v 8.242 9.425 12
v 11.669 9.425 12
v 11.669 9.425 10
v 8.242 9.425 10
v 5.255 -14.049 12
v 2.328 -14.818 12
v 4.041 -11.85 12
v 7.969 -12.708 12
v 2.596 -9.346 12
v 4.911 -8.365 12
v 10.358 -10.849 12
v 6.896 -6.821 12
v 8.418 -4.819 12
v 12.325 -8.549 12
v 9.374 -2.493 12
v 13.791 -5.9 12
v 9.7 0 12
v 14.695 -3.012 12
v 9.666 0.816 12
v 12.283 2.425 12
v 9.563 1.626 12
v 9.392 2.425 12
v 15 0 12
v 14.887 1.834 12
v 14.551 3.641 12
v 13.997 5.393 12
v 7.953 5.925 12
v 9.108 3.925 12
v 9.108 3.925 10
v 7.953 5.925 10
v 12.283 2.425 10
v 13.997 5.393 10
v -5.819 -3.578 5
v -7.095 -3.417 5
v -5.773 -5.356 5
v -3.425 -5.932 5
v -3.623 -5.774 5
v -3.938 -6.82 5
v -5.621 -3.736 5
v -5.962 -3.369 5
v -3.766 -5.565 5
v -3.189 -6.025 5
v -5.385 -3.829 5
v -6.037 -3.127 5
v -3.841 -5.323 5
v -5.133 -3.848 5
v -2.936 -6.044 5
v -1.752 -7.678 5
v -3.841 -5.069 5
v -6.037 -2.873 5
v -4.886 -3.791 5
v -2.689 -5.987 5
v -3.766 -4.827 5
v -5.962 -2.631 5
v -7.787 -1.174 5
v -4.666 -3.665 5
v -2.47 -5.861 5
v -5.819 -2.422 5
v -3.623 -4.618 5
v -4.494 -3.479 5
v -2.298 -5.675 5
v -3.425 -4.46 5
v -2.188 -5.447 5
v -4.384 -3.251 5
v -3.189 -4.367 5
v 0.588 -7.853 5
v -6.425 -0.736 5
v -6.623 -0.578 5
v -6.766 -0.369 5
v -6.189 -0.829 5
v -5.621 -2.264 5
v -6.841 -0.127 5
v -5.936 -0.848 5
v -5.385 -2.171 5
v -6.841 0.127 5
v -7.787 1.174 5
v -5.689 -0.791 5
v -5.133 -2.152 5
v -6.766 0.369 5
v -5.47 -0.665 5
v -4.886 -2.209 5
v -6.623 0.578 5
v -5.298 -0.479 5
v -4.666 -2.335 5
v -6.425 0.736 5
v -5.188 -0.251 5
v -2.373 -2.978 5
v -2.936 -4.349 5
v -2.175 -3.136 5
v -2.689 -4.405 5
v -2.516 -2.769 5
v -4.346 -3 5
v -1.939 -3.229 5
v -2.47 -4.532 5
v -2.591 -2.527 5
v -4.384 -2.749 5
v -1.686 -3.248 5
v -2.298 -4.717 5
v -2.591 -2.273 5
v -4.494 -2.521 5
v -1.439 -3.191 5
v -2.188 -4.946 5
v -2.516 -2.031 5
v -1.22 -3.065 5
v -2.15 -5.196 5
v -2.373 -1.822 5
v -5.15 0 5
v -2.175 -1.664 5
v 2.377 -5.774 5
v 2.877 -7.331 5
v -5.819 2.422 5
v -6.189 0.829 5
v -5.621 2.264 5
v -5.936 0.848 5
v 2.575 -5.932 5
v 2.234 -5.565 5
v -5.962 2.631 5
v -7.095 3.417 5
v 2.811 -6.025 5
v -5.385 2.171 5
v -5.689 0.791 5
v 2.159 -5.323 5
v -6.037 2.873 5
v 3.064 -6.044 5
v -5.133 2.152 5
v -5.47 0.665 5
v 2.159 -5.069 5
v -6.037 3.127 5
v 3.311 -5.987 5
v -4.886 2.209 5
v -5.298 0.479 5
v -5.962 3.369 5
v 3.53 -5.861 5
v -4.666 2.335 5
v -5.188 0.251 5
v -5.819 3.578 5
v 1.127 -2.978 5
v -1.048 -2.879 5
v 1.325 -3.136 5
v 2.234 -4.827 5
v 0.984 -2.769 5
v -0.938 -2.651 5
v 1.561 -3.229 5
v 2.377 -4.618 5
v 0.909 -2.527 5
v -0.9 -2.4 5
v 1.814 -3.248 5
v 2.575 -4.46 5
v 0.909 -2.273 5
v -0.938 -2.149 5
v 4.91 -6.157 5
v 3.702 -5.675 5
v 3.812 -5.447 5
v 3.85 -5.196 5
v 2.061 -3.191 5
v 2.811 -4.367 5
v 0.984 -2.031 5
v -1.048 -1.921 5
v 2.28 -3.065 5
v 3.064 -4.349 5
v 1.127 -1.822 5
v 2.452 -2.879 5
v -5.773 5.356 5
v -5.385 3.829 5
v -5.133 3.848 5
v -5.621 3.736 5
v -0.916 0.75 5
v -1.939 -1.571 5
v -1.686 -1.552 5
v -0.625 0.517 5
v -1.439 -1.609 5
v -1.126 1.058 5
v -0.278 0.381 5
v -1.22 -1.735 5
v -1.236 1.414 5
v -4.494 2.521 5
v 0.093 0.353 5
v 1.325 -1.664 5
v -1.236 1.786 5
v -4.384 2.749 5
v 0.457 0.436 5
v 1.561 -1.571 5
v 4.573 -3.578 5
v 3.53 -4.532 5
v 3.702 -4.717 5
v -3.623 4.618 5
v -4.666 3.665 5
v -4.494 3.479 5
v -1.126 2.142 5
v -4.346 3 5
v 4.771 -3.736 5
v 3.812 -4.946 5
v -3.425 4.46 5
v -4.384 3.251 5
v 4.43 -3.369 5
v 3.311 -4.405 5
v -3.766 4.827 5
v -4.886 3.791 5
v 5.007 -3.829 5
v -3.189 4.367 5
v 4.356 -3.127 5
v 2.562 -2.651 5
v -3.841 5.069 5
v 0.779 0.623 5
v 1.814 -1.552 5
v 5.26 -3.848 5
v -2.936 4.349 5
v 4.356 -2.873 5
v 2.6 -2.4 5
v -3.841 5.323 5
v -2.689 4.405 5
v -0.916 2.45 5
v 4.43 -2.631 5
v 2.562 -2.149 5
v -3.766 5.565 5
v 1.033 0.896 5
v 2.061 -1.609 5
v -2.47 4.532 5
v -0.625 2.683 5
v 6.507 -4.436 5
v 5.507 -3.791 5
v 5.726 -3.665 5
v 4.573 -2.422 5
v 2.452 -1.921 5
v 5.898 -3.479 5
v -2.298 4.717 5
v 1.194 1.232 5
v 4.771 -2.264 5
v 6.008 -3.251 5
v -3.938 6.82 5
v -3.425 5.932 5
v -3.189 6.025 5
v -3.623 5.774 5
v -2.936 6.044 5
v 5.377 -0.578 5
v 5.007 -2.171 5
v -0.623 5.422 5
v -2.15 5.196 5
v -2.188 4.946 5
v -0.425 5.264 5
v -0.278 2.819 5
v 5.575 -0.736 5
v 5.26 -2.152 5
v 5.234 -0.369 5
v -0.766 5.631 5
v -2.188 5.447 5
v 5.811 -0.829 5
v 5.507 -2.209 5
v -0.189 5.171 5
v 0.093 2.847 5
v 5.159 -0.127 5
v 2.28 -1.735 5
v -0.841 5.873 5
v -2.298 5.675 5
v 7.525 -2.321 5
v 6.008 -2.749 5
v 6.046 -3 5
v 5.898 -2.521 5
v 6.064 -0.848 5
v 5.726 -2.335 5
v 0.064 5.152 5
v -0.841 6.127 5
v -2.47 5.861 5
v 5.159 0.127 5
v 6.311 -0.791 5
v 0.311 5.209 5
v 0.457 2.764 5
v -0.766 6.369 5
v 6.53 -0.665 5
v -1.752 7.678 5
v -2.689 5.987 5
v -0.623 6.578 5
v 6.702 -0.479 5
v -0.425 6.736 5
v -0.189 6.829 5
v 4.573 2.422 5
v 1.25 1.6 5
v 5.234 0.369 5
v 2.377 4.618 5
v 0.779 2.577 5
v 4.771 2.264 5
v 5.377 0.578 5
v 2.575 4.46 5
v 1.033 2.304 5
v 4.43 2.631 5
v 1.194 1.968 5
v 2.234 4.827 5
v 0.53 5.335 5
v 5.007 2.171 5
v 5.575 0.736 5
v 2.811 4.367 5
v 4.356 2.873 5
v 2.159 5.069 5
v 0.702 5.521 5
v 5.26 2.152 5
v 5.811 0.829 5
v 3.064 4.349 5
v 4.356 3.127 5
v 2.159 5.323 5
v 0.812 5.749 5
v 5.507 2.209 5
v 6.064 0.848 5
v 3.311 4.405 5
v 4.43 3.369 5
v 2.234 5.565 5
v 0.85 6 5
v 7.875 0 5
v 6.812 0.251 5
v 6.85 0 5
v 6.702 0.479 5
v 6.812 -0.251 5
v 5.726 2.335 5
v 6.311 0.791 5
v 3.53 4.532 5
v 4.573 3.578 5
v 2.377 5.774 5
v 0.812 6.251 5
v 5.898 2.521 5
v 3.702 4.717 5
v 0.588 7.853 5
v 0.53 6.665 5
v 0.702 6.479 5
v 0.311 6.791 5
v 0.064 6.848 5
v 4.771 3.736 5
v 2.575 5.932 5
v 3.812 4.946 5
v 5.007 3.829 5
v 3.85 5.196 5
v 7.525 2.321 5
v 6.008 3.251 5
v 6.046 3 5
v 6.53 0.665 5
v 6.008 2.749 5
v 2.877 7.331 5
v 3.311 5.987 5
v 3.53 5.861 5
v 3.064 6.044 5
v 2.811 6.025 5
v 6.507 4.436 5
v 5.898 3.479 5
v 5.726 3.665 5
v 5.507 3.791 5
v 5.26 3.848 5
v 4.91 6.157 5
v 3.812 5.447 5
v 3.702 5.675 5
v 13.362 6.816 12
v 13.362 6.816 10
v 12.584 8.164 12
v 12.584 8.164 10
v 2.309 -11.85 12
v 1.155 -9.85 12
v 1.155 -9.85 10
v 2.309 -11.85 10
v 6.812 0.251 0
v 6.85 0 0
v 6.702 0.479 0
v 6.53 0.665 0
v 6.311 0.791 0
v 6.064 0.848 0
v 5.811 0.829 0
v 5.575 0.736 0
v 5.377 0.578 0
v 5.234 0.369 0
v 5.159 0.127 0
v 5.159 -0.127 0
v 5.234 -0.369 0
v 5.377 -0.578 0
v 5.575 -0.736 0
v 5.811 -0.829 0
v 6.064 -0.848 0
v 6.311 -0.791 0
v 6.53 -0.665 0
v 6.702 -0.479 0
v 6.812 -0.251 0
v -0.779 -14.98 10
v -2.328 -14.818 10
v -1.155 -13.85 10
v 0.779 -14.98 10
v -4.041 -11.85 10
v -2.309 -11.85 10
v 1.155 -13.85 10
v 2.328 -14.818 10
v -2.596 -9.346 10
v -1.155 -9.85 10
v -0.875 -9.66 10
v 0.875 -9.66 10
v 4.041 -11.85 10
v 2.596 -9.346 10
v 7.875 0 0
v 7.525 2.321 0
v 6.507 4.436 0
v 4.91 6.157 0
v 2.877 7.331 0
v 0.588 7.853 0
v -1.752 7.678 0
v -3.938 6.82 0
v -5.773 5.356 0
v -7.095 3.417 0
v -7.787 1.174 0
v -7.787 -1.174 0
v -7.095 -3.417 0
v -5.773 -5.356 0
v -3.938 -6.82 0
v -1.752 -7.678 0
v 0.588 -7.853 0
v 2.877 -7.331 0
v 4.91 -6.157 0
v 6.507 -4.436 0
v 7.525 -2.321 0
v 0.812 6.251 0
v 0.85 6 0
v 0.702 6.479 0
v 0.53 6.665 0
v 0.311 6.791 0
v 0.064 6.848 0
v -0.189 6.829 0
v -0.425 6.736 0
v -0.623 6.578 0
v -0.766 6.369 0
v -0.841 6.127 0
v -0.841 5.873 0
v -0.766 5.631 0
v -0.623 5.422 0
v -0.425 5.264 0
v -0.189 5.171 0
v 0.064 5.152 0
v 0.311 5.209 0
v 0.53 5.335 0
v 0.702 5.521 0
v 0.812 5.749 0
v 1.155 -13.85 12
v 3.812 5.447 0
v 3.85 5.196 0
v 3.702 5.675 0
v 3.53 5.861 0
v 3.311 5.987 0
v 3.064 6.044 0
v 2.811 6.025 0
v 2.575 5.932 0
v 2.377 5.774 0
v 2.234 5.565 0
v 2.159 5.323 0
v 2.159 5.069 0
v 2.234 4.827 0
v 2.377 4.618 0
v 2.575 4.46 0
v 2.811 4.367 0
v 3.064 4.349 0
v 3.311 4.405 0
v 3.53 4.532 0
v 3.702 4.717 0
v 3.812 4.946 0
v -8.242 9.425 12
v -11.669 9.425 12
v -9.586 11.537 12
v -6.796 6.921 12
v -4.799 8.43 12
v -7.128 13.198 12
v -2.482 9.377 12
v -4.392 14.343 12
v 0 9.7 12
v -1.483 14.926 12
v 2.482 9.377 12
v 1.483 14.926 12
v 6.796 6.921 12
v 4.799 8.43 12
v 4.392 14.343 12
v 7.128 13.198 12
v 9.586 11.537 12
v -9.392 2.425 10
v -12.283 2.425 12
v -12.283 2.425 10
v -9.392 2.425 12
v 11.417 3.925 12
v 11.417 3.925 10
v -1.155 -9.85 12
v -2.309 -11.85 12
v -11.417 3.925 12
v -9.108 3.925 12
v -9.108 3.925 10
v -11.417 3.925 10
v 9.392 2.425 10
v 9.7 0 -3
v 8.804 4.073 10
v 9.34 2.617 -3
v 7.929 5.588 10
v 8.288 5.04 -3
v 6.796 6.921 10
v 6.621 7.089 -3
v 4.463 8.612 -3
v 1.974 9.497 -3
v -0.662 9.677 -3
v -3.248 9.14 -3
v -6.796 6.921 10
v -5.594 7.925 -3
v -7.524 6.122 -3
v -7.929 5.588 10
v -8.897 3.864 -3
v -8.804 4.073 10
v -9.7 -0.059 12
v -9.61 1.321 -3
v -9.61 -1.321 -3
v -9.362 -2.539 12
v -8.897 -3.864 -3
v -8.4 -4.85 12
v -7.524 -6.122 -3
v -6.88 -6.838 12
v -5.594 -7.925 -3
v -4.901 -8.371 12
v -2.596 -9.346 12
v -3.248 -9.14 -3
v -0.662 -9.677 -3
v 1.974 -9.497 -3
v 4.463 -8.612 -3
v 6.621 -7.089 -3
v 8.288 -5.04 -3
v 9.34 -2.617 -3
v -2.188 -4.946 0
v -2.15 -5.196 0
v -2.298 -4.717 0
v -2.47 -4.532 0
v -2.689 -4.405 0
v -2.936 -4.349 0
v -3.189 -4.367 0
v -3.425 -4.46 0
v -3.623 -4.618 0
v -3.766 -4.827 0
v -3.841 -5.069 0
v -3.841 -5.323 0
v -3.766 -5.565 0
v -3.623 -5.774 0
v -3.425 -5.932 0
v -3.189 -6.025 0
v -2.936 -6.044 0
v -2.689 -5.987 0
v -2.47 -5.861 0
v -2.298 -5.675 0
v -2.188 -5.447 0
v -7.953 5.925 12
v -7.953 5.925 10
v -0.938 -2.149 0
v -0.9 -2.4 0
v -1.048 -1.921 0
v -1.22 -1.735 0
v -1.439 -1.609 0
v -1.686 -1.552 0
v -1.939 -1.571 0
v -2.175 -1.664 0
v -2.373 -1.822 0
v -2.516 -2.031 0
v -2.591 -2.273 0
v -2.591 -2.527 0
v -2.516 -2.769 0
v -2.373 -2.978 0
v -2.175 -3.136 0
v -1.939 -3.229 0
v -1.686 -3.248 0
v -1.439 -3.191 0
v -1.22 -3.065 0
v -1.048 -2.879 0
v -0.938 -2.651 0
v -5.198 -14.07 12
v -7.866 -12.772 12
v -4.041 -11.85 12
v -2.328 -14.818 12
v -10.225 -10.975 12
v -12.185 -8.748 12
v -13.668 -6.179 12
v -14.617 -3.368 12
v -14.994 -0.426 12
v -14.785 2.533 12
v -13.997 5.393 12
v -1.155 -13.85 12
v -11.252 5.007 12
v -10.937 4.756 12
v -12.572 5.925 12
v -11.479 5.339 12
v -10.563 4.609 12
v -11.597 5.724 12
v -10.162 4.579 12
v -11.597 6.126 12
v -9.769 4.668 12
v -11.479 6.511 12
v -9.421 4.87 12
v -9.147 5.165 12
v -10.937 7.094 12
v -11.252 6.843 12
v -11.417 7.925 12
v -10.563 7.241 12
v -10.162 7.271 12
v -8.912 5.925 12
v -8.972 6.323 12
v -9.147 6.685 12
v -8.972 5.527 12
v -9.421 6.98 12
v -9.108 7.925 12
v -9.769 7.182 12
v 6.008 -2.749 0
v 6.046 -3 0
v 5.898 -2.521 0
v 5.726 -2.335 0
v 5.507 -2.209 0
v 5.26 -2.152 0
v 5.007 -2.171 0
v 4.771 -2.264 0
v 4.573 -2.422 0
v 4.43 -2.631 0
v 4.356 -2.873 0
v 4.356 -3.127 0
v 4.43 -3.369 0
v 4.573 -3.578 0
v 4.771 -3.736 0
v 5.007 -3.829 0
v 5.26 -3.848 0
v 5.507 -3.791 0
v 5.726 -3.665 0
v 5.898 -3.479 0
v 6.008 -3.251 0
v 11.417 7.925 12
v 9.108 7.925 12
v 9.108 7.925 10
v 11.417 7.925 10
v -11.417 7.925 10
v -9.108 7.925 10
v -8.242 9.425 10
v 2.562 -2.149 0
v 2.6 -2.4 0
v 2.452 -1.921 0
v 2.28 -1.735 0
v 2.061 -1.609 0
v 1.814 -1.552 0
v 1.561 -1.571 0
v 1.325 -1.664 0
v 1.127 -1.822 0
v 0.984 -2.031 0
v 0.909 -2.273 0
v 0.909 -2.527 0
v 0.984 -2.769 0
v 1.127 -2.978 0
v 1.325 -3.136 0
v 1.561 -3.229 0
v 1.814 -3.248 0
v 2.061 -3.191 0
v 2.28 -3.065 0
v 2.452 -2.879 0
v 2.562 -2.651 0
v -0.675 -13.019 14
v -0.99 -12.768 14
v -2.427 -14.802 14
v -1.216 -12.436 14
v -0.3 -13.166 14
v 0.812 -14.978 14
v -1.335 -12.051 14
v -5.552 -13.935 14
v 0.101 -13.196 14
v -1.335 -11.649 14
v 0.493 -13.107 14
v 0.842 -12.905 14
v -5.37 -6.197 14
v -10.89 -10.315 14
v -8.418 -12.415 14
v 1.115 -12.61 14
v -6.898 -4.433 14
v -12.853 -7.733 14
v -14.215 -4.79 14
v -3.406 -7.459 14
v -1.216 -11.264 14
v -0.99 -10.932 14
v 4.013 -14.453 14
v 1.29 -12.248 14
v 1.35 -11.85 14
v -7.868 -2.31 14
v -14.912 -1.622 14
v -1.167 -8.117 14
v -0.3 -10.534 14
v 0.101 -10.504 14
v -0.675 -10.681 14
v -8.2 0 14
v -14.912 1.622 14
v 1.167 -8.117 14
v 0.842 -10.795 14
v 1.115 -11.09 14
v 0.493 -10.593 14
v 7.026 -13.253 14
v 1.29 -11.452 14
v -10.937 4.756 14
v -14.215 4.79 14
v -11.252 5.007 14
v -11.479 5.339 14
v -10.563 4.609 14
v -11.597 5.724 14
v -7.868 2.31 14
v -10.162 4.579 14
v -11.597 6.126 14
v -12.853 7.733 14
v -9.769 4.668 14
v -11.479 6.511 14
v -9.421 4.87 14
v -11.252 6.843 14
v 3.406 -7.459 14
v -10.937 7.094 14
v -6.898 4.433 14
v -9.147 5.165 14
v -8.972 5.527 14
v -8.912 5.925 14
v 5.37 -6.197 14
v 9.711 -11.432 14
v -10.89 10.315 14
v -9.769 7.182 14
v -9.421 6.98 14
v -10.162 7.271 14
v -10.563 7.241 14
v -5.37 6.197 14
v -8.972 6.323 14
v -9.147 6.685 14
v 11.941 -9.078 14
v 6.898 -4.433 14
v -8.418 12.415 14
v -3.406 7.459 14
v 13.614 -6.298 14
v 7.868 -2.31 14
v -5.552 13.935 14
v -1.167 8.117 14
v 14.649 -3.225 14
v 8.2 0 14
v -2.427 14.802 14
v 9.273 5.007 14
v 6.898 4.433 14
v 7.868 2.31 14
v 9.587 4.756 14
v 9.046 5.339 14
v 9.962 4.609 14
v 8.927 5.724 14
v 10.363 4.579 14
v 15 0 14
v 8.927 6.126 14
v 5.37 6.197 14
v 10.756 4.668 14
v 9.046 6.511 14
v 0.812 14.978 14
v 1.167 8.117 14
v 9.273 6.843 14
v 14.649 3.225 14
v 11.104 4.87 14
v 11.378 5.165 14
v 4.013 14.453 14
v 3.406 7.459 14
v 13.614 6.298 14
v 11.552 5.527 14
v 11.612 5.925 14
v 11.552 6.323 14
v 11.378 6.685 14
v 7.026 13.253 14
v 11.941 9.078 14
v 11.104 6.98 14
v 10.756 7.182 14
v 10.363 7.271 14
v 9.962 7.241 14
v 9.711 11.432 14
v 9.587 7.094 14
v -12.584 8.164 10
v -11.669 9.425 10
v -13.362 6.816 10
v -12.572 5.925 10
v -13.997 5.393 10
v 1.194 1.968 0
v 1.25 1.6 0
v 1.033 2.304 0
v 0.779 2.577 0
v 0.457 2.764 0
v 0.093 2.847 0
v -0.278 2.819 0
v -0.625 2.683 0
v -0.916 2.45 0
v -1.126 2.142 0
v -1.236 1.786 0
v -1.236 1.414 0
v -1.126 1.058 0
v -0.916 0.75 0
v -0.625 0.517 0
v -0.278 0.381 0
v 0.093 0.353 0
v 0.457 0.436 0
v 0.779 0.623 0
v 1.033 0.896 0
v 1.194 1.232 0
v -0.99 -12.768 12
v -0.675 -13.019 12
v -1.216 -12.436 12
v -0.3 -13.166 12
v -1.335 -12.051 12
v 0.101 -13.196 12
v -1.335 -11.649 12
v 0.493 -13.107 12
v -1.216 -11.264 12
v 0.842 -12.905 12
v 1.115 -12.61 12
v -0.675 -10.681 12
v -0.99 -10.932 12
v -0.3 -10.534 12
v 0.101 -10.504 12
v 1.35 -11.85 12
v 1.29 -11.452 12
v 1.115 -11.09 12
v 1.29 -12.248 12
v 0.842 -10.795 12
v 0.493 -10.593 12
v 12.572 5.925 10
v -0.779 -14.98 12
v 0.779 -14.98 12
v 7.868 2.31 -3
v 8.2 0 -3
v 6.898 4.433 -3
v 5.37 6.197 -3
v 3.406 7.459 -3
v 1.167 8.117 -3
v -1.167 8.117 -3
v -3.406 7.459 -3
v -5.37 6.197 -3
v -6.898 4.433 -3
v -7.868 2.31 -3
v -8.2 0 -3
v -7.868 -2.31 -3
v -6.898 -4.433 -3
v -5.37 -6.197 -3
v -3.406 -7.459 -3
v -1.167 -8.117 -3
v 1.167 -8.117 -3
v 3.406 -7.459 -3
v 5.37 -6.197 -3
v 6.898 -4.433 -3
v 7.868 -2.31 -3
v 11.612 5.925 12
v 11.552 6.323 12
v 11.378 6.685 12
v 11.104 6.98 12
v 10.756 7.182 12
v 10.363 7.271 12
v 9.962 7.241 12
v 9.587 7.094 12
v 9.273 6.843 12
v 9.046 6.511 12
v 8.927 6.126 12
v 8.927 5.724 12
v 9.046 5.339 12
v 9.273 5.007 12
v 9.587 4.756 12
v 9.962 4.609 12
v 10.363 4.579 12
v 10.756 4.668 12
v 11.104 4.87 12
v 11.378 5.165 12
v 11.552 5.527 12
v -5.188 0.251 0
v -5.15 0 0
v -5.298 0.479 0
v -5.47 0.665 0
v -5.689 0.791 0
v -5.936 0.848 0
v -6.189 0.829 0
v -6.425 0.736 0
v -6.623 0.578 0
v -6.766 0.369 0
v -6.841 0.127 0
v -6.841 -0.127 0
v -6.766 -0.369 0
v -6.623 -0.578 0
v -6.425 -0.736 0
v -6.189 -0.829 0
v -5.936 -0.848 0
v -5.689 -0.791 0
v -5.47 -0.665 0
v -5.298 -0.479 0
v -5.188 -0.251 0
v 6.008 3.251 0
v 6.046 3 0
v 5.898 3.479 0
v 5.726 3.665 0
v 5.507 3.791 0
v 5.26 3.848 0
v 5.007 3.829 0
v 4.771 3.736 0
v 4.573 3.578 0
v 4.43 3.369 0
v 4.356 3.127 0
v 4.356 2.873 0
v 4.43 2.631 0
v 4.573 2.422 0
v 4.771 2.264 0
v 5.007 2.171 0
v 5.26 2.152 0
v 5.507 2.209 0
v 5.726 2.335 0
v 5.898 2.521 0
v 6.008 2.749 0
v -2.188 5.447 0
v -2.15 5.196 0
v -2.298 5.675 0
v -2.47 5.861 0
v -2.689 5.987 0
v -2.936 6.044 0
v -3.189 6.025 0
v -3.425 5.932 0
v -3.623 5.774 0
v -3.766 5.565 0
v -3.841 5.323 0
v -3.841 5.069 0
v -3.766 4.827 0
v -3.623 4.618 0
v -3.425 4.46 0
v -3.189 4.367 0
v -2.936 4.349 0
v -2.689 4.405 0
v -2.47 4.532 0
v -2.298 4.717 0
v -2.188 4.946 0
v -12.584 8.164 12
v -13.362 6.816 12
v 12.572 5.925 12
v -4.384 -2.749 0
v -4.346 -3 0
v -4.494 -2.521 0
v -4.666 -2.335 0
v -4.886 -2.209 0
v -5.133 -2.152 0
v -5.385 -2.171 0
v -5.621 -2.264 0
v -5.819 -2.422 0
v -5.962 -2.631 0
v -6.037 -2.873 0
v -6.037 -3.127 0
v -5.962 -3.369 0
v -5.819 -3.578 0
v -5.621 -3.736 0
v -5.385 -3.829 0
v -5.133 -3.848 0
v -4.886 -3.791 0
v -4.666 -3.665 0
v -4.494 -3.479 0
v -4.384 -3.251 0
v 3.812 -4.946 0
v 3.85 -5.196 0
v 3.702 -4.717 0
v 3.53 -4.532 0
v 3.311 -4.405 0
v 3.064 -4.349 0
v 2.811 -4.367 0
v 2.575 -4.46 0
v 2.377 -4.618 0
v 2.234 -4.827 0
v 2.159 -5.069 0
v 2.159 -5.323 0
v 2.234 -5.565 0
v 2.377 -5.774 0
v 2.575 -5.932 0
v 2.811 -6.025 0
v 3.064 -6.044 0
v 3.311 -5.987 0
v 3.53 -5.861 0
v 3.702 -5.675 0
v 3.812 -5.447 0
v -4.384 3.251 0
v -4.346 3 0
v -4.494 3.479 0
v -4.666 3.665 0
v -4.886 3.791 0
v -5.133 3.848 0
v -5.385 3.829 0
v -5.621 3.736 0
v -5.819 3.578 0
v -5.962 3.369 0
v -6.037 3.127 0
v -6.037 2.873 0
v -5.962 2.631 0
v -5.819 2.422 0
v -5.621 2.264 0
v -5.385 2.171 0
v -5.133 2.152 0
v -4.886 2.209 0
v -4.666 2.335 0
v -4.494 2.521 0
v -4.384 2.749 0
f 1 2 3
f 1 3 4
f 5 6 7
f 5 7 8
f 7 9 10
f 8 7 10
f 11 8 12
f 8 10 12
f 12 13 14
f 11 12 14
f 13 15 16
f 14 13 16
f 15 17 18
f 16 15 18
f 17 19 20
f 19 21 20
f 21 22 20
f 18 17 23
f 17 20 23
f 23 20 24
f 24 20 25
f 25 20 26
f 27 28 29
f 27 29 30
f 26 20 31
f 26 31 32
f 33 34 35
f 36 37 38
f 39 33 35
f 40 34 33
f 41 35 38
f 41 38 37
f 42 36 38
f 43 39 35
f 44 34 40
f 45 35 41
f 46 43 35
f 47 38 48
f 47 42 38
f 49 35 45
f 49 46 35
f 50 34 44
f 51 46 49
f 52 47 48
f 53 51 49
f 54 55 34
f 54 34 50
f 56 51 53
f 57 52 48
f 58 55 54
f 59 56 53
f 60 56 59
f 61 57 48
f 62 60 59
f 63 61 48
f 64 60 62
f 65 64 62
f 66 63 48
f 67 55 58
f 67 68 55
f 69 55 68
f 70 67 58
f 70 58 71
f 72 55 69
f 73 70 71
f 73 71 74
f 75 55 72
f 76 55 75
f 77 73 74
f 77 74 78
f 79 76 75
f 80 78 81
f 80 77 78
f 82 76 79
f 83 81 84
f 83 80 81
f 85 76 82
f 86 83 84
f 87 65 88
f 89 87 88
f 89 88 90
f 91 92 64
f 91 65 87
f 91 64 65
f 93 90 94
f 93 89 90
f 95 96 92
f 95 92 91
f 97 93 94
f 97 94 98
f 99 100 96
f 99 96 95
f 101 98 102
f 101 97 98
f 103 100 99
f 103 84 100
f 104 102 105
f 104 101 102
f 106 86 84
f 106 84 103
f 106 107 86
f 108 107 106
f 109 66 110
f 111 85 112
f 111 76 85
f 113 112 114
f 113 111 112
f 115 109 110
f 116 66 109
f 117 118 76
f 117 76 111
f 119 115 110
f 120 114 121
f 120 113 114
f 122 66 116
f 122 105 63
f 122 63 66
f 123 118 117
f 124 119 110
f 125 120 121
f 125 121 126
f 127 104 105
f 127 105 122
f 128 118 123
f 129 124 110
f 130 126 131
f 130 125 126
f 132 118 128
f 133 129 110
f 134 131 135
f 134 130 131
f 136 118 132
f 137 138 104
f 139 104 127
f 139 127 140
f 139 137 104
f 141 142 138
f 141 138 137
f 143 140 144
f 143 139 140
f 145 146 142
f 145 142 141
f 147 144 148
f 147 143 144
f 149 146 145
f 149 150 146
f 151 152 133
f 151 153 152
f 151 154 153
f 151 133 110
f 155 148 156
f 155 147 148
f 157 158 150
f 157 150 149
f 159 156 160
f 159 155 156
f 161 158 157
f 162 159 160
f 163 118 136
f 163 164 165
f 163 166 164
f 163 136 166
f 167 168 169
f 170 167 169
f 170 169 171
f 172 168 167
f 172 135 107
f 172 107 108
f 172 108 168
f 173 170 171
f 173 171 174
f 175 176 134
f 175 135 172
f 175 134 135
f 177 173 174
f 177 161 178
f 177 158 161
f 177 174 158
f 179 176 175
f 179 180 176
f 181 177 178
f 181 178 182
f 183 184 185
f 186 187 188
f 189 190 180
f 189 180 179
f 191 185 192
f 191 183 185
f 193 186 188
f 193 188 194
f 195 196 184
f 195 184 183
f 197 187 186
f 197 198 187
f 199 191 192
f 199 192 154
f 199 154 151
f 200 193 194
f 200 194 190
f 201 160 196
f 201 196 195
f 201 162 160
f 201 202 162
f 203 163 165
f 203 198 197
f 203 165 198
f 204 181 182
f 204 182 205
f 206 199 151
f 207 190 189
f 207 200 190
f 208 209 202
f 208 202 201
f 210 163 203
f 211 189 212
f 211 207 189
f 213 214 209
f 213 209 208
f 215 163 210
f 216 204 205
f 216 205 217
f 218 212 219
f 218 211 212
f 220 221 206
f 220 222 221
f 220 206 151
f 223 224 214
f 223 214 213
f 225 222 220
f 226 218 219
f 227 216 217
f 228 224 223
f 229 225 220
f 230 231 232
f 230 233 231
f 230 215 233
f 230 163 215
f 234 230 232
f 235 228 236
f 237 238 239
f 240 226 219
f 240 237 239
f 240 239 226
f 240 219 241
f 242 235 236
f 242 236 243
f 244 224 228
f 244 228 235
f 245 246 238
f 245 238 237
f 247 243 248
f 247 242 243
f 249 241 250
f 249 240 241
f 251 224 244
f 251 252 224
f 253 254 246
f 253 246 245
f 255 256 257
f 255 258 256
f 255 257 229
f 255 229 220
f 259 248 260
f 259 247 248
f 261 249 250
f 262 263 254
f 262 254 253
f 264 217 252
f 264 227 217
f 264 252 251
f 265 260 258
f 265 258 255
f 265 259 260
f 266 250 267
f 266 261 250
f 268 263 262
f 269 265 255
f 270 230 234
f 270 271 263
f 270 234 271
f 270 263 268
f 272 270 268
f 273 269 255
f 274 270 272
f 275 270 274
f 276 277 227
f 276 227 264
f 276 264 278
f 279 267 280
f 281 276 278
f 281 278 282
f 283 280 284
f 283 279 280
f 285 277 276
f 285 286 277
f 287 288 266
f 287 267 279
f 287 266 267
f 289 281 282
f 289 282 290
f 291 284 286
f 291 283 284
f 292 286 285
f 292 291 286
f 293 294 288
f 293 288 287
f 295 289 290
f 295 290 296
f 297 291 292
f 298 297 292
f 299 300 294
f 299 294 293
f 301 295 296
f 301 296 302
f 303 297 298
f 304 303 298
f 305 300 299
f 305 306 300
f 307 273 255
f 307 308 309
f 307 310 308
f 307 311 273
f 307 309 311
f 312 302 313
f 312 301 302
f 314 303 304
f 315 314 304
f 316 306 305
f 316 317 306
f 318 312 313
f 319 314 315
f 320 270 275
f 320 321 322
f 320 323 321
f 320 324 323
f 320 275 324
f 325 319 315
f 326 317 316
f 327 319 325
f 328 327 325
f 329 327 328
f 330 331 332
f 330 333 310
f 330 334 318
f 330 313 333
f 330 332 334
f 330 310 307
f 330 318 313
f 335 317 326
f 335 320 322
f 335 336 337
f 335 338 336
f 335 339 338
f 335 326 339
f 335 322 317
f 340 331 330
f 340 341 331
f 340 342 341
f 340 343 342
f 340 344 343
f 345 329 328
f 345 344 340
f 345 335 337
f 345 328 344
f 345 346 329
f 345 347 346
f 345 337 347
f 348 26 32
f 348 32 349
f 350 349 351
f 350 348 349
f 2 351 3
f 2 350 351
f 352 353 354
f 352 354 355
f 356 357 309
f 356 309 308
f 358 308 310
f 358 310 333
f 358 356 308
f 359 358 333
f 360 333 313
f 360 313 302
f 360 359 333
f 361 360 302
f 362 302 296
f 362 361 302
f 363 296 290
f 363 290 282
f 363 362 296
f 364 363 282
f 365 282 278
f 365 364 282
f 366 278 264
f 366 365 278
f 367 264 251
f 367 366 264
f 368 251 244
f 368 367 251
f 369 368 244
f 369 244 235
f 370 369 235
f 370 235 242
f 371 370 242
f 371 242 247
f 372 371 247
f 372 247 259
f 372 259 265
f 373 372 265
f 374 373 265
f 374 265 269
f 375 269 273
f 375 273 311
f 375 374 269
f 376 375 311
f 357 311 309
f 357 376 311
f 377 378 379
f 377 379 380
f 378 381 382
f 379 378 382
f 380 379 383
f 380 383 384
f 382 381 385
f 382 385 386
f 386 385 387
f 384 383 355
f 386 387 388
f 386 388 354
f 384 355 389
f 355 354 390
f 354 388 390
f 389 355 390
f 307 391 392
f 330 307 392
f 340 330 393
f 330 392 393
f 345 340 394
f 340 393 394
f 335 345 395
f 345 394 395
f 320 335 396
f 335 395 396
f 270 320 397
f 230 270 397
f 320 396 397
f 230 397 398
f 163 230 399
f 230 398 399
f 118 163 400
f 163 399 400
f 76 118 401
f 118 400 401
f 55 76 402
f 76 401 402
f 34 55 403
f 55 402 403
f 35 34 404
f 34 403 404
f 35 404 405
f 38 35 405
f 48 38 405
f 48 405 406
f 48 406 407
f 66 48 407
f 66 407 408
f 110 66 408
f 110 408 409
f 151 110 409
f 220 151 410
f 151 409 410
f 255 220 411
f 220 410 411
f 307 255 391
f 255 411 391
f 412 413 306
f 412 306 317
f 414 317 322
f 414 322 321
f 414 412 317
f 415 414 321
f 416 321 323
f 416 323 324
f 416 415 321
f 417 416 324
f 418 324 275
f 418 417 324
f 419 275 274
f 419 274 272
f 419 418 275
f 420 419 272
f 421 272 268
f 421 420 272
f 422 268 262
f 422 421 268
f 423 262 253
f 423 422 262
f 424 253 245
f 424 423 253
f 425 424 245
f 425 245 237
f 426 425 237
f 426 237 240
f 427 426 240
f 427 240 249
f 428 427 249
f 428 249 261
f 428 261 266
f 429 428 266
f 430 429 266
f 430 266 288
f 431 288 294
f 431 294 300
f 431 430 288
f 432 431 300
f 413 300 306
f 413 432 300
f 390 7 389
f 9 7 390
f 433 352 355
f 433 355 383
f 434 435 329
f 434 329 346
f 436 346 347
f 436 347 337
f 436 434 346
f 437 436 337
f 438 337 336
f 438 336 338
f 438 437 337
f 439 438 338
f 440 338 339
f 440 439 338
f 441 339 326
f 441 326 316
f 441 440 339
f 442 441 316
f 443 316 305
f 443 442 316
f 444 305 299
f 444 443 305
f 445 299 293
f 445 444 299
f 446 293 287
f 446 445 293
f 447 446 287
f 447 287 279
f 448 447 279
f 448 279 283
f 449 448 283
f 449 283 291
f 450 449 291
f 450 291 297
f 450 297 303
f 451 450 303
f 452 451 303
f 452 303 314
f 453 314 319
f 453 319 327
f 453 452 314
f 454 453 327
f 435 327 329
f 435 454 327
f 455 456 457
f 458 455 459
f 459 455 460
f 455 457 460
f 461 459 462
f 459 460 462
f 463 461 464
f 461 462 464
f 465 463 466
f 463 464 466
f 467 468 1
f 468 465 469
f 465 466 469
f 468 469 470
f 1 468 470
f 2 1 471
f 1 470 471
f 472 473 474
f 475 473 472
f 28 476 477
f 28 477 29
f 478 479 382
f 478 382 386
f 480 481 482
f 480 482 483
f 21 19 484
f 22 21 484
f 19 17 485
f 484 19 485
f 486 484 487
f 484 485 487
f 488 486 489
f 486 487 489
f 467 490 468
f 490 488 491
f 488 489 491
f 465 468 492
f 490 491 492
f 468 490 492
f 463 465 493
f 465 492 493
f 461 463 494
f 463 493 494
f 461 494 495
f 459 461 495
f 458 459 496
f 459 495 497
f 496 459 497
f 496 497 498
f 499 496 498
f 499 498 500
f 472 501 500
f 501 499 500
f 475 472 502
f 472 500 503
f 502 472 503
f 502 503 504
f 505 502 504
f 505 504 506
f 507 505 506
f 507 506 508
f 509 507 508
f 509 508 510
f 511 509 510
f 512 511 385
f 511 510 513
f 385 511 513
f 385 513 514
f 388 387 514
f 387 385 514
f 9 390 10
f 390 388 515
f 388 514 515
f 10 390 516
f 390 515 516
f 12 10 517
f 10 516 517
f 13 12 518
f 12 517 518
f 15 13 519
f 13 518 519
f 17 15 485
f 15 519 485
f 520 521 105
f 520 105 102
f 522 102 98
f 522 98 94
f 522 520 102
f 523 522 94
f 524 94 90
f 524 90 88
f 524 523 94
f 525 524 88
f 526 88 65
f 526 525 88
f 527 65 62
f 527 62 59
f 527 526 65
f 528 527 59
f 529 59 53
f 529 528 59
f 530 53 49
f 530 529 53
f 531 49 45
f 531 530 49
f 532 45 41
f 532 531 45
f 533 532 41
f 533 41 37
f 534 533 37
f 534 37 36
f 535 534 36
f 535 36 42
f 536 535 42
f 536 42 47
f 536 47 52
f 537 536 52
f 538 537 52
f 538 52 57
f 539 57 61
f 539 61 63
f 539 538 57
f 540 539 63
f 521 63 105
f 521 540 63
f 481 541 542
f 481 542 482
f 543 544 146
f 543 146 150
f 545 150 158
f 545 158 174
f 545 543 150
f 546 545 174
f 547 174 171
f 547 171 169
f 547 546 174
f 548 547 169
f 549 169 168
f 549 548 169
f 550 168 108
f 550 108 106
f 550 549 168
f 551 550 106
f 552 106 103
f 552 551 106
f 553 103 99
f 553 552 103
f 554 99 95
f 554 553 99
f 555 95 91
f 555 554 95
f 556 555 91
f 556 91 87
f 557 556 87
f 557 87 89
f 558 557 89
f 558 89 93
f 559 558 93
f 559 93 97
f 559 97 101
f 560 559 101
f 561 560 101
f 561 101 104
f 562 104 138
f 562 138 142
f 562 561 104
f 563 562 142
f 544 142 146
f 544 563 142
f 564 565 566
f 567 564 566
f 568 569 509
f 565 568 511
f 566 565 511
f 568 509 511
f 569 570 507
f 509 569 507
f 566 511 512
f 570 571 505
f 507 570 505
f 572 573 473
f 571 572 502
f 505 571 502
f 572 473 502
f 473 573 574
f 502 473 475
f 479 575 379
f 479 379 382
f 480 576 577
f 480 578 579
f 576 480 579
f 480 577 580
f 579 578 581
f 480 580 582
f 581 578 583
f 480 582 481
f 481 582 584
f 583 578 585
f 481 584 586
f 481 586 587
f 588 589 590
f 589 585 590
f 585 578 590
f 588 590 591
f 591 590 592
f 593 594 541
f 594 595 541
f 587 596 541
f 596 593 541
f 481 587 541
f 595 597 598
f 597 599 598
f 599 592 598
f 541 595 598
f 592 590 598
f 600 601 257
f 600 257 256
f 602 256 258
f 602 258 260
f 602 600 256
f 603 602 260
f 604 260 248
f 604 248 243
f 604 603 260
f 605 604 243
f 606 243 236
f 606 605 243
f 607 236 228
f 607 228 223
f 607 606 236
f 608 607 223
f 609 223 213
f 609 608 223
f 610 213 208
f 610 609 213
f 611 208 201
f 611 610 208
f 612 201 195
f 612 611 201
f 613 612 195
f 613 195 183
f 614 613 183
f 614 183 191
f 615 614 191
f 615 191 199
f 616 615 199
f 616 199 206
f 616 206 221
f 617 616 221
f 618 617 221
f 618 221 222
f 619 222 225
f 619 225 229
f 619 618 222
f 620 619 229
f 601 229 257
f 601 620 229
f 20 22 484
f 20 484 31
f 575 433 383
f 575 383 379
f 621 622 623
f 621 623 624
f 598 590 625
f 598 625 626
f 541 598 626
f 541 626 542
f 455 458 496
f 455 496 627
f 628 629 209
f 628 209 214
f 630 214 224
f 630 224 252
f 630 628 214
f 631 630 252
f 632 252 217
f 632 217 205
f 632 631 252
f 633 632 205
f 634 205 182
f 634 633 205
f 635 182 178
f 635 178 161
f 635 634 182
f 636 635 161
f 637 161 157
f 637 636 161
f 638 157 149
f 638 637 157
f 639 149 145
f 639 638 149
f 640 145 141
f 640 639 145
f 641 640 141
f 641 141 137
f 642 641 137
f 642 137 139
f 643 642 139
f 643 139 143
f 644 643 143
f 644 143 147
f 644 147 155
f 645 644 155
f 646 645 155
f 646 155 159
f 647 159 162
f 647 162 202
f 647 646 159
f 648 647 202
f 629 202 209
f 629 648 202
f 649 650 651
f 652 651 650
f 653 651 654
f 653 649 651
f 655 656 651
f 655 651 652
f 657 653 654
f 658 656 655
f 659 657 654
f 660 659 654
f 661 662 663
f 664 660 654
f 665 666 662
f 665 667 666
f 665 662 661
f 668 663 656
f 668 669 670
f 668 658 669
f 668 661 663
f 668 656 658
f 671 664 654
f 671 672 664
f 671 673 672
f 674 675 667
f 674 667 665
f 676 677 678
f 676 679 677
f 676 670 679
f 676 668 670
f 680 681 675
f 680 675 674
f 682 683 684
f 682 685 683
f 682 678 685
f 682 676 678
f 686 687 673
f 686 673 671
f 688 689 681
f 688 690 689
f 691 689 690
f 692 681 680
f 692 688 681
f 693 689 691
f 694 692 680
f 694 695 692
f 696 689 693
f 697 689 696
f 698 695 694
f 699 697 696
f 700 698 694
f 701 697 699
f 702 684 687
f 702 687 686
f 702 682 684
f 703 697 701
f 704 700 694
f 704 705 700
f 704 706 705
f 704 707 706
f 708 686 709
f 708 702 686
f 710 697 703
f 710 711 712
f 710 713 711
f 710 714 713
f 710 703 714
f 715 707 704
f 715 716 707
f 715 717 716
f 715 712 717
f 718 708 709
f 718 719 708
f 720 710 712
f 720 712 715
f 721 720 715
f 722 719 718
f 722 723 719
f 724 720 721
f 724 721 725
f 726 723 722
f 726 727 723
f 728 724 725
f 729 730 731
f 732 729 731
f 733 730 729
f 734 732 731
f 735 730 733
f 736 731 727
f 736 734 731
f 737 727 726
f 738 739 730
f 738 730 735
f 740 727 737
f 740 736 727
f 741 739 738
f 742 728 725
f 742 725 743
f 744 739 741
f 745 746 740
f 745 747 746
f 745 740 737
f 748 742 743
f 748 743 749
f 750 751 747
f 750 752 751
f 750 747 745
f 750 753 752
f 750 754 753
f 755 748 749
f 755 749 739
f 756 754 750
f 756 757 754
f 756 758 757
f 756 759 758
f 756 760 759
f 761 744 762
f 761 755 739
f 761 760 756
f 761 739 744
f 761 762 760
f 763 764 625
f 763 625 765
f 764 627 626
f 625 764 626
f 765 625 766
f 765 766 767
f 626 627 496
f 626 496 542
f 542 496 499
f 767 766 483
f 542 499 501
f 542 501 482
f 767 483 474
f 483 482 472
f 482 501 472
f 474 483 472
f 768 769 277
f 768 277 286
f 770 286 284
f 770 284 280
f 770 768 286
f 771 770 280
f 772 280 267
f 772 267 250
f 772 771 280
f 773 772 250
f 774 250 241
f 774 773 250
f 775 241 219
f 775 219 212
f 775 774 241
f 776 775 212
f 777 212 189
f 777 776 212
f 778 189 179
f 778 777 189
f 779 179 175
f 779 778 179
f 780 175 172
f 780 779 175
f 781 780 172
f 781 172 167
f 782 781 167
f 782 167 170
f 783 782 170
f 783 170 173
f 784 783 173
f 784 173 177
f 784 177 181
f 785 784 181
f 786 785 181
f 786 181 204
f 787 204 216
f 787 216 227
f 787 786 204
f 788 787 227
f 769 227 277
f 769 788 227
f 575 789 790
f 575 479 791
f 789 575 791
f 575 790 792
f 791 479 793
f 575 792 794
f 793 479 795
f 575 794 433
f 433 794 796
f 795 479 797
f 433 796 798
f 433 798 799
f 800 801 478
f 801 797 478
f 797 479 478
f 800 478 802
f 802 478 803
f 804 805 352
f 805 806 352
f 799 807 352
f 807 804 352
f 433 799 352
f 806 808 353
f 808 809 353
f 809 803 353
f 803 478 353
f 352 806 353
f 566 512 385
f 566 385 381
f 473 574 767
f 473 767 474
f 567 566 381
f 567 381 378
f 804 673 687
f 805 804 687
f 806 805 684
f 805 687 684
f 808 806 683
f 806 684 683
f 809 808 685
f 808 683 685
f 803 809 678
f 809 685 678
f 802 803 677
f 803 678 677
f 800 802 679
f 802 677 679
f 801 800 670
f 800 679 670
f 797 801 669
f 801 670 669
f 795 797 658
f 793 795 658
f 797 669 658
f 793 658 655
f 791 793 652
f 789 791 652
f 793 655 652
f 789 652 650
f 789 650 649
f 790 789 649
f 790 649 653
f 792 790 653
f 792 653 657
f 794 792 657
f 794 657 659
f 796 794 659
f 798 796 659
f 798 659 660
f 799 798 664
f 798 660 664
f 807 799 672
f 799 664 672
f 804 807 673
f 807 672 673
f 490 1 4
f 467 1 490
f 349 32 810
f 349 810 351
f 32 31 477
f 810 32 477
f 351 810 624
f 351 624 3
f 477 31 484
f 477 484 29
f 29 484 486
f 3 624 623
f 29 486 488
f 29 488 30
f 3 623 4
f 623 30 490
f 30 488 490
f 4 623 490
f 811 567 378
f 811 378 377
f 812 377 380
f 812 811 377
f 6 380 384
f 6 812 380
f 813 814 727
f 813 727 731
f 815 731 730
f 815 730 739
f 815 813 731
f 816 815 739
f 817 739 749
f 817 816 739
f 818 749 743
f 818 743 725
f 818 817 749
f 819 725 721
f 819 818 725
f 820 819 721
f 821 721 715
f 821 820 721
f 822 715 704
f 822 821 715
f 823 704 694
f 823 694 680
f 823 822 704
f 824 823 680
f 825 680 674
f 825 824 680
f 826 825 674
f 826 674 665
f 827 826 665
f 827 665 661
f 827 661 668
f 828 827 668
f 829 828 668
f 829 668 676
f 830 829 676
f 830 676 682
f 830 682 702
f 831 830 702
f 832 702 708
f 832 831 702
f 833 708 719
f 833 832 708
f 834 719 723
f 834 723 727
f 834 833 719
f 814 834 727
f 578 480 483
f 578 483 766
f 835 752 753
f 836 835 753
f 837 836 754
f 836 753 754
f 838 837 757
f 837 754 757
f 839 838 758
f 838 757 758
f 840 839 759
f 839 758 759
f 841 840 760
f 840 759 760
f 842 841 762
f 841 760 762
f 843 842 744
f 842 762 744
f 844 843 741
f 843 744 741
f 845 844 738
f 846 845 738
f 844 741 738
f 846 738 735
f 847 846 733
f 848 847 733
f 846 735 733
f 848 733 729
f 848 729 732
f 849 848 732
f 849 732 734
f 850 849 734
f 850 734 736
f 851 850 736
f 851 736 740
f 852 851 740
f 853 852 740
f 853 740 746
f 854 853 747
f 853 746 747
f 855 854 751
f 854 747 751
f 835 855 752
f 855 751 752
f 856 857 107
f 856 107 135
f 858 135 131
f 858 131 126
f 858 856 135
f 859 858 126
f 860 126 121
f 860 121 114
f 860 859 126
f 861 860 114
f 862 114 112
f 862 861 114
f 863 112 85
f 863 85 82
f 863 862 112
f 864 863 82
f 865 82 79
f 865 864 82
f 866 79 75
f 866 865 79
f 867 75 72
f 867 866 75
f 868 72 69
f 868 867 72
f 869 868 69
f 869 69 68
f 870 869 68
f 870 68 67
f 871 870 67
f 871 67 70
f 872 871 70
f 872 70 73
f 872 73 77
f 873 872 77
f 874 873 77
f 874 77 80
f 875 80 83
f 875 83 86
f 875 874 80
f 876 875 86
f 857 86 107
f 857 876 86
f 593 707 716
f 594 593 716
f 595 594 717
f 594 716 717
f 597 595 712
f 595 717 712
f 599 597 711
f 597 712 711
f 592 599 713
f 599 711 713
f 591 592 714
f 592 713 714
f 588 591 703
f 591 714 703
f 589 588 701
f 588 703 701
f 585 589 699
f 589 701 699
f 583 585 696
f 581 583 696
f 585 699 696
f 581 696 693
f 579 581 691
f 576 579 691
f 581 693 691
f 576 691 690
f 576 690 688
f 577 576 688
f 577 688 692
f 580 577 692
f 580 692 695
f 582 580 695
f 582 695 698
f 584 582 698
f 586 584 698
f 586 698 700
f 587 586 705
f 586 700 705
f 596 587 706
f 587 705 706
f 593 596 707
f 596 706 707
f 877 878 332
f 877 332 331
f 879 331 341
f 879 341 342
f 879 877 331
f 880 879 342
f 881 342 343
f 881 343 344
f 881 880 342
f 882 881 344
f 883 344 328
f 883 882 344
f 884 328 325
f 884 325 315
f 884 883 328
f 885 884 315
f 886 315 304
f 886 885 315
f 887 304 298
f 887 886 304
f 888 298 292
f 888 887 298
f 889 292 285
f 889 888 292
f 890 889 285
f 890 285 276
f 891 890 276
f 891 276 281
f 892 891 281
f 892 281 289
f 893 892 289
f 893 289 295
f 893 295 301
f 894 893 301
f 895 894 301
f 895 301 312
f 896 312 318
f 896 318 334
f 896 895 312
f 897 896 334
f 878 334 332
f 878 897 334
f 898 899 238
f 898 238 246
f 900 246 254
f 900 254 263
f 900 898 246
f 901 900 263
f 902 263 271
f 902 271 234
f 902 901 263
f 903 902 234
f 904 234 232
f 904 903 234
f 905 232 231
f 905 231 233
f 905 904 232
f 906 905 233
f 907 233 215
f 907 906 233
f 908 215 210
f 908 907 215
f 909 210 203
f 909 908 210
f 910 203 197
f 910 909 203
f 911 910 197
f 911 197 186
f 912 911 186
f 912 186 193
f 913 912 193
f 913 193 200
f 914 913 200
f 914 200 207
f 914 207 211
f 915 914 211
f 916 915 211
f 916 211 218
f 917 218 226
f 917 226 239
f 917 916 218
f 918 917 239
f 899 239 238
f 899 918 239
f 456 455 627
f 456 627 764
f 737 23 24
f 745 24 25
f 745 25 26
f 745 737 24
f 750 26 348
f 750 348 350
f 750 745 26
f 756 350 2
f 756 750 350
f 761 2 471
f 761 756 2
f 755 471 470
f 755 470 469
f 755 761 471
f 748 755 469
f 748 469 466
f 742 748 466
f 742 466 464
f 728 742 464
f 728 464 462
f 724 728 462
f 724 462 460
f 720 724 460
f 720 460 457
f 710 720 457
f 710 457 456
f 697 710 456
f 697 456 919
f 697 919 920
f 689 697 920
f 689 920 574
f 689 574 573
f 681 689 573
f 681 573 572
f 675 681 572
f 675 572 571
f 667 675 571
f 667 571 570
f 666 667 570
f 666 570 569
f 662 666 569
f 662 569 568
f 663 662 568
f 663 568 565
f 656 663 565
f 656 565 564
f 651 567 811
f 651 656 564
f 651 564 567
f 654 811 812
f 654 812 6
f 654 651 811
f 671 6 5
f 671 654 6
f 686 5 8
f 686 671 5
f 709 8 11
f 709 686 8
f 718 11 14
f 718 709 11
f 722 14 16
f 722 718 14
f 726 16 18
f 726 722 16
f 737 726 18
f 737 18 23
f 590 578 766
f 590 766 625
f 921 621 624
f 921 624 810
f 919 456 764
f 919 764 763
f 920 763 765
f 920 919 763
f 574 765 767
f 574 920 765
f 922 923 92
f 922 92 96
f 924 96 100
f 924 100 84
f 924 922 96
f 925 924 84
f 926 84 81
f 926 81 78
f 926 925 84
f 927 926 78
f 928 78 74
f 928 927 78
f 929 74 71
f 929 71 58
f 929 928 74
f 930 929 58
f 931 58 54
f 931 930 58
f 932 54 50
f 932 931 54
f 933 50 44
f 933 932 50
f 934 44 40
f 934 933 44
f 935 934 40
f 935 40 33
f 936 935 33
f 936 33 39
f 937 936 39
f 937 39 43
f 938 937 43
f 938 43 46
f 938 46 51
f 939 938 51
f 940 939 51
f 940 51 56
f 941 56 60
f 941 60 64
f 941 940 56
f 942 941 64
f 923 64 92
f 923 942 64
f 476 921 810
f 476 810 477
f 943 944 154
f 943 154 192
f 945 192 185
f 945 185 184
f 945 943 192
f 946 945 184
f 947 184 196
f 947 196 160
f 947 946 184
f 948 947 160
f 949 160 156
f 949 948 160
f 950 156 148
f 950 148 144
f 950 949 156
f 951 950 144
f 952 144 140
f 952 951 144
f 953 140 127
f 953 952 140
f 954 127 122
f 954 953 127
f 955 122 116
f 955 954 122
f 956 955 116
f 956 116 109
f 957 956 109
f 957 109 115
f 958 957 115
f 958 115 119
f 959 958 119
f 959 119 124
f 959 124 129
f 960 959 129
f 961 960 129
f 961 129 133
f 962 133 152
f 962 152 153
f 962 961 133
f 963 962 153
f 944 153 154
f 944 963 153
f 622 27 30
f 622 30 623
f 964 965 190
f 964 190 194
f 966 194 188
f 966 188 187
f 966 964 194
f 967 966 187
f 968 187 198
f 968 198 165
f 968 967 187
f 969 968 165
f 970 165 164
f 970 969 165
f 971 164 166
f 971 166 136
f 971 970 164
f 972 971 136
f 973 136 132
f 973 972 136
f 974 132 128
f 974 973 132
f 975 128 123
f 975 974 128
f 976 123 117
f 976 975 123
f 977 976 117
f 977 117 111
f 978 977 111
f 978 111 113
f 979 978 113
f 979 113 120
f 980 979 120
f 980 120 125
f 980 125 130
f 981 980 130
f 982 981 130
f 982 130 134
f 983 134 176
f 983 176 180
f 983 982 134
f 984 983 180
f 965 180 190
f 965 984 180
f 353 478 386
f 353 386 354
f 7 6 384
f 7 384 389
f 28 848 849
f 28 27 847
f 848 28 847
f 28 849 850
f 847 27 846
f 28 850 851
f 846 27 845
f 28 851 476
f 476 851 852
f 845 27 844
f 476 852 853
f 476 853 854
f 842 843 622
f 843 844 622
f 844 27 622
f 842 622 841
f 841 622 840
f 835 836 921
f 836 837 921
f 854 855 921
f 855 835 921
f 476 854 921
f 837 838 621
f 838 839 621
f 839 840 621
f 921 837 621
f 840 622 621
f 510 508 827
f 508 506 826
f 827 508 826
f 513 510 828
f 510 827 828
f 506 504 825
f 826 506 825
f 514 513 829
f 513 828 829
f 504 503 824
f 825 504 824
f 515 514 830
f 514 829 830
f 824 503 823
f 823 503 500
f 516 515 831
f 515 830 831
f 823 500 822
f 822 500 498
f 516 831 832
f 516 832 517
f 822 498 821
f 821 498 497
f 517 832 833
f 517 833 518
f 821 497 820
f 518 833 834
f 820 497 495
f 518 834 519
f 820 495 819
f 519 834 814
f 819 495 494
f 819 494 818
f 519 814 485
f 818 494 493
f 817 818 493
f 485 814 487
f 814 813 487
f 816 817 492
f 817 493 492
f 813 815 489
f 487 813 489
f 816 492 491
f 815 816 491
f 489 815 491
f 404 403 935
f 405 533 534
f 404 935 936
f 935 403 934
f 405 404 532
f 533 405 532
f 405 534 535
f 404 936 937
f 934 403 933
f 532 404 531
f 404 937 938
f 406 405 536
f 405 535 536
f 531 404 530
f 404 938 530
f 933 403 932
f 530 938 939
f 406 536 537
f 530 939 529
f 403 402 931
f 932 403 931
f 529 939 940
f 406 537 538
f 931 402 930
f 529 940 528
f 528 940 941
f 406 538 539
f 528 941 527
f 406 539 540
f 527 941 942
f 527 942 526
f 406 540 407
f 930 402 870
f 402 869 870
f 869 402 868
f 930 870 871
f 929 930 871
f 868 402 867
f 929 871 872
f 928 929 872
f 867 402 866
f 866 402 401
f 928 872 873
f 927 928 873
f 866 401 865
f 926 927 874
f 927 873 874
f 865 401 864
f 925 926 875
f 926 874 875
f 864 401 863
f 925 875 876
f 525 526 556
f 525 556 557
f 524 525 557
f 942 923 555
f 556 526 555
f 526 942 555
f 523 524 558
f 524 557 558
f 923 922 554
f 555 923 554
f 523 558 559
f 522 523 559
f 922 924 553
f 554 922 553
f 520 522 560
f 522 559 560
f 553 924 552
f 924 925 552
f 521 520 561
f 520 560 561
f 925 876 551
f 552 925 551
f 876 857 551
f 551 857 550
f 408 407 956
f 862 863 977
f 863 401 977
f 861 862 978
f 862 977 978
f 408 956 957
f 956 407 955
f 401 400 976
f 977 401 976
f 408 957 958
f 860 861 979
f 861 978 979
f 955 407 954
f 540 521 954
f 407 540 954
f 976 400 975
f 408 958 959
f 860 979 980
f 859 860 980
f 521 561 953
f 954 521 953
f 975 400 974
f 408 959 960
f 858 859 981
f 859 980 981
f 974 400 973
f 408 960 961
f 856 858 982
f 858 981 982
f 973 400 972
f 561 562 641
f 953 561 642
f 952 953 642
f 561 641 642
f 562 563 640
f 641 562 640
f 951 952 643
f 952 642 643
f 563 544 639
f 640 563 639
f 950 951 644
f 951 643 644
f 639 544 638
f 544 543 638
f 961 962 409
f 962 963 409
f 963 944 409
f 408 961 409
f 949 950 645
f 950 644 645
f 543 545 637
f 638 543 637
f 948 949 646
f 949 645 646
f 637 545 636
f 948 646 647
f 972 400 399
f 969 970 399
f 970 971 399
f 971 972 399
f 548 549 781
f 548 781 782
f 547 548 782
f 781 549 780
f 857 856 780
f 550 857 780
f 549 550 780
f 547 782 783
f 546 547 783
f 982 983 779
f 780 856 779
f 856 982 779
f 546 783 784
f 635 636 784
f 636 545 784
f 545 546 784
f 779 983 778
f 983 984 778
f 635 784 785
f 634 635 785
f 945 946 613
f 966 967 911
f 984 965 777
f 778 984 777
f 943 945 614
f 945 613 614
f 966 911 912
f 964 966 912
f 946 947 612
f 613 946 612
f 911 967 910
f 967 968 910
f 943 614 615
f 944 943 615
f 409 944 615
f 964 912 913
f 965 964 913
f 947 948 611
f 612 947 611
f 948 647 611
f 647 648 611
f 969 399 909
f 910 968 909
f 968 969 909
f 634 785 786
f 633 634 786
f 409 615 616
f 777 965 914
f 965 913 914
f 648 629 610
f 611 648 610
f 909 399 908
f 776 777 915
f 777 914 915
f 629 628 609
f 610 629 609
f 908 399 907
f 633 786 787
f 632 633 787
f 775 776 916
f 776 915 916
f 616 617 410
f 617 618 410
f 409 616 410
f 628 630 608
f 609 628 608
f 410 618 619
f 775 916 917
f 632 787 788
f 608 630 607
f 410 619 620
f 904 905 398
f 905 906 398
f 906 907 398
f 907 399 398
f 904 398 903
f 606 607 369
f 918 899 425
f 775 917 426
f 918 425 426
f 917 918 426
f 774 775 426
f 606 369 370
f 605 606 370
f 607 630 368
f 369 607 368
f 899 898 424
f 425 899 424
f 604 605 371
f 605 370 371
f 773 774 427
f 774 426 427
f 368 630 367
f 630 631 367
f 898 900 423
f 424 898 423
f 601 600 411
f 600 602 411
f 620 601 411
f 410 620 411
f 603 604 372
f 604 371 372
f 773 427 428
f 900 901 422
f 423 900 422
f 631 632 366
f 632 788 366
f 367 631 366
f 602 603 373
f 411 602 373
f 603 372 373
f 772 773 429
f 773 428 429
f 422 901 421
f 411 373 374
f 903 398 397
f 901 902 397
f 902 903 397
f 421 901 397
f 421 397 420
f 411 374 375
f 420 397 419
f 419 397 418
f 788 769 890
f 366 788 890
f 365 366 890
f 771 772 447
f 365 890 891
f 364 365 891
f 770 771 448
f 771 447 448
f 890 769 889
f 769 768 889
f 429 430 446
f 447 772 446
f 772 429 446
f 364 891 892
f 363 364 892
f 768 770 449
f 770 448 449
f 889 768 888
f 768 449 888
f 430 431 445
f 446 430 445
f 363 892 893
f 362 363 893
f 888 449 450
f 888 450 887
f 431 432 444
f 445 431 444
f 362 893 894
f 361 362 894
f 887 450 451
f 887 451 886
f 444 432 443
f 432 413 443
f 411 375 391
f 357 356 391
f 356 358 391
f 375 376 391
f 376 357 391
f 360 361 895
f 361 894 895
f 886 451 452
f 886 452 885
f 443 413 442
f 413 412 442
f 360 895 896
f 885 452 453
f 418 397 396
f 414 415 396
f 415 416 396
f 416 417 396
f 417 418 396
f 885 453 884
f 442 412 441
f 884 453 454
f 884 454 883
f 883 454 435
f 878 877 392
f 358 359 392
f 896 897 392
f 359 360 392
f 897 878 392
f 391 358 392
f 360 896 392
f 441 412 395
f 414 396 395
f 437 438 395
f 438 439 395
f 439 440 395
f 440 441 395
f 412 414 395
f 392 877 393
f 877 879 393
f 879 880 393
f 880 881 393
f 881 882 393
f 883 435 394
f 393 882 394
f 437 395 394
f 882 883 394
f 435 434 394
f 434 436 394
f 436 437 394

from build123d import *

# Parameters (mm, degrees)
SKETCH1_R                 = 7.875
SKETCH1_R_2               = 0.85
SKETCH1_R_3               = 1.25
BOSS_EXTRUDE1_DEPTH       = 5
EXTRUDE_THIN1_START       = -3
EXTRUDE_THIN1_OUTLINE_R   = 9.7
EXTRUDE_THIN1_OUTLINE_R_2 = 8.2
EXTRUDE_THIN1_DEPTH       = 17
SKETCH4_R                 = 15
SKETCH4_R_2               = 9.7
SKETCH4_R_3               = 1.35
BOSS_EXTRUDE2_DEPTH       = 2
BOSS_EXTRUDE3_START       = -2
BOSS_EXTRUDE3_DEPTH       = 2
CIRPATTERN1_COUNT         = 3
SKETCH4_5_R               = 1.35
CUT_EXTRUDE1_DEPTH        = 2


# Read off the part's stored shape, not the designer's step: Extrude-Thin1
with BuildPart() as part:
    # Sketch1 → Boss-Extrude1 (new body)
    with BuildSketch(Plane.XY):
        Circle(SKETCH1_R)
        with Locations((0, 6)):
            Circle(SKETCH1_R_2, mode=Mode.SUBTRACT)
        with Locations((3, 5.196152423)):
            Circle(SKETCH1_R_2, mode=Mode.SUBTRACT)
        with Locations((5.196152423, 3)):
            Circle(SKETCH1_R_2, mode=Mode.SUBTRACT)
        with Locations((6, 0)):
            Circle(SKETCH1_R_2, mode=Mode.SUBTRACT)
        with Locations((5.196152423, -3)):
            Circle(SKETCH1_R_2, mode=Mode.SUBTRACT)
        with Locations((3, -5.196152423)):
            Circle(SKETCH1_R_2, mode=Mode.SUBTRACT)
        with Locations((-3, -5.196152423)):
            Circle(SKETCH1_R_2, mode=Mode.SUBTRACT)
        with Locations((-5.196152423, -3)):
            Circle(SKETCH1_R_2, mode=Mode.SUBTRACT)
        with Locations((-6, 0)):
            Circle(SKETCH1_R_2, mode=Mode.SUBTRACT)
        with Locations((-5.196152423, 3)):
            Circle(SKETCH1_R_2, mode=Mode.SUBTRACT)
        with Locations((-3, 5.196152423)):
            Circle(SKETCH1_R_2, mode=Mode.SUBTRACT)
        with Locations((1.75, -2.4)):
            Circle(SKETCH1_R_2, mode=Mode.SUBTRACT)
        with Locations((-1.75, -2.4)):
            Circle(SKETCH1_R_2, mode=Mode.SUBTRACT)
        with Locations((0, 1.6)):
            Circle(SKETCH1_R_3, mode=Mode.SUBTRACT)
    extrude(amount=BOSS_EXTRUDE1_DEPTH)


with BuildPart() as body_2:
    # Extrude-Thin1 outline → Extrude-Thin1 (new body)
    with BuildSketch(Plane.XY.offset(EXTRUDE_THIN1_START)):
        Circle(EXTRUDE_THIN1_OUTLINE_R)
        Circle(EXTRUDE_THIN1_OUTLINE_R_2, mode=Mode.SUBTRACT)
    extrude(amount=EXTRUDE_THIN1_DEPTH)

    # Sketch4 → Boss-Extrude2 (add)
    with BuildSketch(Plane.XY.offset(14)):
        Circle(SKETCH4_R)
        Circle(SKETCH4_R_2, mode=Mode.SUBTRACT)
        with Locations((0, -11.85)):
            Circle(SKETCH4_R_3, mode=Mode.SUBTRACT)
    boss_extrude2 = extrude(amount=-BOSS_EXTRUDE2_DEPTH)

    # Sketch4<4> → Boss-Extrude3 (add)
    with BuildSketch(Plane.XY.offset(14).offset(BOSS_EXTRUDE3_START)):
        with BuildLine():
            Line((2.327707719, -14.818291966), (4.041451884, -11.85))
            Line((4.041451884, -11.85), (2.595880703, -9.346197268))
            ThreePointArc((2.595880703, -9.346197268), (0, -9.7), (-2.595880703, -9.346197268))
            Line((-2.595880703, -9.346197268), (-4.041451884, -11.85))
            Line((-4.041451884, -11.85), (-2.327707719, -14.818291966))
            ThreePointArc((-2.327707719, -14.818291966), (0, -15), (2.327707719, -14.818291966))
        make_face()
        Polygon((1.154700538, -9.85), (2.309401077, -11.85), (1.154700538, -13.85), (-1.154700538, -13.85), (-2.309401077, -11.85), (-1.154700538, -9.85), align=None, mode=Mode.SUBTRACT)
    boss_extrude3 = extrude(amount=-BOSS_EXTRUDE3_DEPTH)

    # CirPattern1: Boss-Extrude2, Boss-Extrude3 ×3 about axis
    cirpattern1_axis = Axis((0, 0, 0), (0, 0, 1))
    add([boss_extrude2.rotate(cirpattern1_axis, i * 360 / CIRPATTERN1_COUNT) for i in range(1, CIRPATTERN1_COUNT)])
    add([boss_extrude3.rotate(cirpattern1_axis, i * 360 / CIRPATTERN1_COUNT) for i in range(1, CIRPATTERN1_COUNT)])

    # Sketch4<5> → Cut-Extrude1 (cut)
    with BuildSketch(Plane.XY.offset(14)):
        with Locations((-10.262401035, 5.925)):
            Circle(SKETCH4_5_R)
        with Locations((10.262401035, 5.925)):
            Circle(SKETCH4_5_R)
        with Locations((0, -11.85)):
            Circle(SKETCH4_5_R)
    extrude(amount=-CUT_EXTRUDE1_DEPTH, mode=Mode.SUBTRACT)


solid = Compound([part.part, body_2.part])
